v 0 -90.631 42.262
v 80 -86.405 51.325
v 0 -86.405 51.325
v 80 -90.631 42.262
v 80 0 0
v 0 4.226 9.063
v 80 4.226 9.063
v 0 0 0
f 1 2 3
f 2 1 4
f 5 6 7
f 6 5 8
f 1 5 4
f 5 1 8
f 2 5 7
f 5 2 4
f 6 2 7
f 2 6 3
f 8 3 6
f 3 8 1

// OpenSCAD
// Phone Stand

/* [Dimensions] */
width = 80;        // [50:120]
thickness = 10;    // [4:20]
angle = 65;        // [30:85]

/* [Options] */
cable_slot = true;
slot_width = 20;   // [10:40]

module stand() {
    rotate([angle, 0, 0])
        cube([width, thickness, 100]);
}

stand();
